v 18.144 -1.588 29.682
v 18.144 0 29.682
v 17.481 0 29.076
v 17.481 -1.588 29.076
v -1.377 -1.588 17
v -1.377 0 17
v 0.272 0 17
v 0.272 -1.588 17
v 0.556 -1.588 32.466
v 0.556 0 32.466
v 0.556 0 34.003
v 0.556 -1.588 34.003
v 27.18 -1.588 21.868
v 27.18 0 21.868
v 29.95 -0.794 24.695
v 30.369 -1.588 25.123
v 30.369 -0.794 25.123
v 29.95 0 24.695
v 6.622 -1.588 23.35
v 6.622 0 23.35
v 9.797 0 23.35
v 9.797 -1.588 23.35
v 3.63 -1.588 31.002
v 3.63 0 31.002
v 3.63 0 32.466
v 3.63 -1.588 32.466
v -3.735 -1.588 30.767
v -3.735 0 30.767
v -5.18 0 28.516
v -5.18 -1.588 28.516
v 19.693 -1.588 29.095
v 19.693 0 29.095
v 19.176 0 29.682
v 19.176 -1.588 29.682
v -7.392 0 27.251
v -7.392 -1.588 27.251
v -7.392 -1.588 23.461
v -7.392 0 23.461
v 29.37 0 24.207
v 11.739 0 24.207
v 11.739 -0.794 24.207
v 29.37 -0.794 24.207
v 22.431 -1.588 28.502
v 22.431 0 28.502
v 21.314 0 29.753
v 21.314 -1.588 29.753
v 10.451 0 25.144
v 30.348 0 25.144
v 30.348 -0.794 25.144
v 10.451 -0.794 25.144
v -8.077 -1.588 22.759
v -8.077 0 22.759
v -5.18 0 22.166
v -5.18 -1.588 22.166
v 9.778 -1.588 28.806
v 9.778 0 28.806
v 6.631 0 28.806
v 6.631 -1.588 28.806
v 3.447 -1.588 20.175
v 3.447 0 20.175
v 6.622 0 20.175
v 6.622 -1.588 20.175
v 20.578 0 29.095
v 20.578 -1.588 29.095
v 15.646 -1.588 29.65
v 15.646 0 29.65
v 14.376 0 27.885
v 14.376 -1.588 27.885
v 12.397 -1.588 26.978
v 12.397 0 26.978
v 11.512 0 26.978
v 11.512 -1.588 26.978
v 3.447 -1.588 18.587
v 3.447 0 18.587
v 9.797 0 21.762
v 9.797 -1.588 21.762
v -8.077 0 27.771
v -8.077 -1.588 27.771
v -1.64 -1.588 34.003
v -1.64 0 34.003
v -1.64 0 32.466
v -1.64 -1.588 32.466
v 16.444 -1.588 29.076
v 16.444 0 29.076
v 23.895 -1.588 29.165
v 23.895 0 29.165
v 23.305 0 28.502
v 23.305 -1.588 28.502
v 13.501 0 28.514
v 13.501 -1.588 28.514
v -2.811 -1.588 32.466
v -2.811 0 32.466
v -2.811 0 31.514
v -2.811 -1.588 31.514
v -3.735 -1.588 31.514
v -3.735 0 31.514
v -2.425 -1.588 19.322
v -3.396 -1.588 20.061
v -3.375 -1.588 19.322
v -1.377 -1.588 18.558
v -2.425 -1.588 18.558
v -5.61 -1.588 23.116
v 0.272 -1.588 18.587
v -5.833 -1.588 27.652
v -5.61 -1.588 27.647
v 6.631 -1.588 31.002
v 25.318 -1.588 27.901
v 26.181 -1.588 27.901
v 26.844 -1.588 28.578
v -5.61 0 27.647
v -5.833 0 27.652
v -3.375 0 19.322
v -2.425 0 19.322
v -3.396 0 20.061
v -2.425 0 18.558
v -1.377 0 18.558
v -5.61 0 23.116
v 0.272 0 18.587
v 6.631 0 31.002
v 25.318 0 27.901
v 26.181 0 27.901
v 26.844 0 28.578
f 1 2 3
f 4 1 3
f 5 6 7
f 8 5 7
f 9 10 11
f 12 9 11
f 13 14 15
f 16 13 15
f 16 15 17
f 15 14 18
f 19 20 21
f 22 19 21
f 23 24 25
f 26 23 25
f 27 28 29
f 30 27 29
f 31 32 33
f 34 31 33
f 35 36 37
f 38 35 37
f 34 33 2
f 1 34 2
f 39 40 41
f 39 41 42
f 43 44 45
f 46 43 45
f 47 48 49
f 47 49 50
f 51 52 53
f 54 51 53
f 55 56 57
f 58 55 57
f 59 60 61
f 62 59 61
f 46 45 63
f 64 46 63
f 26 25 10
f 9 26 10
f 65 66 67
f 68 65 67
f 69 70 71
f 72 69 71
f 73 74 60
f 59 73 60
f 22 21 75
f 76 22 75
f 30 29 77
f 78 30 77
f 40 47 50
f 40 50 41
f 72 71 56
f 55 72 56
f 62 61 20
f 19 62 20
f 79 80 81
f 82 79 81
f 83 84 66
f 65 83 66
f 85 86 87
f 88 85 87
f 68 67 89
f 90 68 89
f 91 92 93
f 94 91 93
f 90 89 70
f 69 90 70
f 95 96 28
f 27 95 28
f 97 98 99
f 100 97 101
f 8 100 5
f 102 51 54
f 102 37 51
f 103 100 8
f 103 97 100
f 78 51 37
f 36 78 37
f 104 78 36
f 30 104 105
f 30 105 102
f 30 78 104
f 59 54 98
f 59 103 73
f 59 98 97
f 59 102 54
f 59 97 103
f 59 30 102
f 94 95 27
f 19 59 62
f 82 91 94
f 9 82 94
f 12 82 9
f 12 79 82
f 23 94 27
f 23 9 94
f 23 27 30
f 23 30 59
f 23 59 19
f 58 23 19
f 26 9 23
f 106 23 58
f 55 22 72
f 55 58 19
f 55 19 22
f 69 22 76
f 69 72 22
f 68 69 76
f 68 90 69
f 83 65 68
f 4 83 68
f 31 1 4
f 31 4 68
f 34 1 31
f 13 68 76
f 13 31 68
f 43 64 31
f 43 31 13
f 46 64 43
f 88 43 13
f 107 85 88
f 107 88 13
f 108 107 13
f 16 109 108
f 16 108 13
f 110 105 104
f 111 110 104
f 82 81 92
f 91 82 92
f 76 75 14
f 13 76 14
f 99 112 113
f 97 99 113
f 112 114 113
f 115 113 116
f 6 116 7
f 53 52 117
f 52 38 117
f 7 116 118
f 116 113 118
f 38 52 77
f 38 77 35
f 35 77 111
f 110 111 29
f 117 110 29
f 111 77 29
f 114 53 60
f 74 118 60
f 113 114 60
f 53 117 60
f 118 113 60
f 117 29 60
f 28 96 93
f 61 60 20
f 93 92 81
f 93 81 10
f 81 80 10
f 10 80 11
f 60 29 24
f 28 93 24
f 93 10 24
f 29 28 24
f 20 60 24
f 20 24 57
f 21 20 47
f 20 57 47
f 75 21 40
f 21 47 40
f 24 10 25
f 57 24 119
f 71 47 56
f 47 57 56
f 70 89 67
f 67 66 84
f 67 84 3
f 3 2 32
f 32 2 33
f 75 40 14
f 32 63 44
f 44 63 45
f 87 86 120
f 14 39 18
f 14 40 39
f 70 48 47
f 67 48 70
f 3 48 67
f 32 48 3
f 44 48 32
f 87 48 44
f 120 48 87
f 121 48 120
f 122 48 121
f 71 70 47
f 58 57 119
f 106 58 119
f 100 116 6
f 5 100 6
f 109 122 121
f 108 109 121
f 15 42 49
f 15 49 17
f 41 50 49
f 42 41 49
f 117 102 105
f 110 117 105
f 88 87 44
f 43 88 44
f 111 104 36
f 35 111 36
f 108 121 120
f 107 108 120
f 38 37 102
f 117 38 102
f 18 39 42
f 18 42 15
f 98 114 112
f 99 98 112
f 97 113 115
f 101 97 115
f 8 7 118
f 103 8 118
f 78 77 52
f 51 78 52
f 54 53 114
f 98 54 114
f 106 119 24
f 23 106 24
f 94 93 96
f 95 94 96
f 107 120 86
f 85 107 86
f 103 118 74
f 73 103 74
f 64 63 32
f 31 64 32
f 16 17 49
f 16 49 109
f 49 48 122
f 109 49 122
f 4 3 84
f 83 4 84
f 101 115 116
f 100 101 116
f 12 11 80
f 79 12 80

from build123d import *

# Parameters (mm, degrees)
F2_DEPTH = 1.5875
F4_DEPTH = 1.5875
F5_DEPTH = 0.79375


with BuildPart() as f2:
    # F0 (on Front) → F2 (new body)
    with BuildSketch(Plane.XZ):
        Polygon((9.796584, 23.349988), (9.796584, 21.762488), (27.18009, 21.868323), (30.369195, 25.123497), (26.843533, 28.5776), (26.180675, 27.901009), (25.318117, 27.901009), (23.894507, 29.16527), (23.305416, 28.501929), (22.430886, 28.501929), (21.314058, 29.752675), (20.577589, 29.095061), (19.692793, 29.095061), (19.176317, 29.681733), (18.144356, 29.681733), (17.481392, 29.075808), (16.444386, 29.075808), (15.645858, 29.650049), (14.37626, 27.884573), (13.501141, 28.513893), (12.396776, 26.978187), (11.511933, 26.978187), (9.777895, 28.805975), (6.630678, 28.805975), (6.630678, 31.001708), (3.629841, 31.001708), (3.629841, 32.465532), (0.555814, 32.465532), (0.555814, 34.002542), (-1.63992, 34.002542), (-1.63992, 32.465532), (-2.810978, 32.465532), (-2.810978, 31.514045), (-3.735324, 31.514045), (-3.735324, 30.767458), (-5.180371, 28.516009), (-5.180371, 22.166009), (-3.396362, 20.060986), (-3.375214, 19.322162), (-2.425008, 19.322162), (-2.425008, 18.557757), (-1.376822, 18.557757), (-1.376822, 16.999988), (0.271584, 16.999988), (0.271584, 18.587488), (3.446584, 18.587488), (3.446584, 20.174988), (6.621584, 20.174988), (6.621584, 23.349988), align=None)
        Polygon((-8.077298, 22.759162), (-5.180371, 22.166009), (-5.180371, 28.516009), (-8.077298, 27.770618), (-8.077298, 27.149362), align=None)
    extrude(amount=F2_DEPTH)

    # F3 (on face) → F4 (cut)
    with BuildSketch(Plane.XZ.offset(1.5875)):
        Polygon((-5.609657, 27.647099), (-5.833327, 27.652194), (-7.391887, 27.251171), (-7.391887, 23.460561), (-5.609657, 23.115788), align=None)
    extrude(amount=-F4_DEPTH, mode=Mode.SUBTRACT)

    # F1 (on face) → F5 (cut)
    with BuildSketch(Plane.XZ):
        Polygon((30.482488, 25.144005), (28.022444, 25.144005), (10.450701, 25.144005), (11.739296, 24.206847), (29.369611, 24.206847), align=None)
    extrude(amount=F5_DEPTH, mode=Mode.SUBTRACT)


solid = f2.part
